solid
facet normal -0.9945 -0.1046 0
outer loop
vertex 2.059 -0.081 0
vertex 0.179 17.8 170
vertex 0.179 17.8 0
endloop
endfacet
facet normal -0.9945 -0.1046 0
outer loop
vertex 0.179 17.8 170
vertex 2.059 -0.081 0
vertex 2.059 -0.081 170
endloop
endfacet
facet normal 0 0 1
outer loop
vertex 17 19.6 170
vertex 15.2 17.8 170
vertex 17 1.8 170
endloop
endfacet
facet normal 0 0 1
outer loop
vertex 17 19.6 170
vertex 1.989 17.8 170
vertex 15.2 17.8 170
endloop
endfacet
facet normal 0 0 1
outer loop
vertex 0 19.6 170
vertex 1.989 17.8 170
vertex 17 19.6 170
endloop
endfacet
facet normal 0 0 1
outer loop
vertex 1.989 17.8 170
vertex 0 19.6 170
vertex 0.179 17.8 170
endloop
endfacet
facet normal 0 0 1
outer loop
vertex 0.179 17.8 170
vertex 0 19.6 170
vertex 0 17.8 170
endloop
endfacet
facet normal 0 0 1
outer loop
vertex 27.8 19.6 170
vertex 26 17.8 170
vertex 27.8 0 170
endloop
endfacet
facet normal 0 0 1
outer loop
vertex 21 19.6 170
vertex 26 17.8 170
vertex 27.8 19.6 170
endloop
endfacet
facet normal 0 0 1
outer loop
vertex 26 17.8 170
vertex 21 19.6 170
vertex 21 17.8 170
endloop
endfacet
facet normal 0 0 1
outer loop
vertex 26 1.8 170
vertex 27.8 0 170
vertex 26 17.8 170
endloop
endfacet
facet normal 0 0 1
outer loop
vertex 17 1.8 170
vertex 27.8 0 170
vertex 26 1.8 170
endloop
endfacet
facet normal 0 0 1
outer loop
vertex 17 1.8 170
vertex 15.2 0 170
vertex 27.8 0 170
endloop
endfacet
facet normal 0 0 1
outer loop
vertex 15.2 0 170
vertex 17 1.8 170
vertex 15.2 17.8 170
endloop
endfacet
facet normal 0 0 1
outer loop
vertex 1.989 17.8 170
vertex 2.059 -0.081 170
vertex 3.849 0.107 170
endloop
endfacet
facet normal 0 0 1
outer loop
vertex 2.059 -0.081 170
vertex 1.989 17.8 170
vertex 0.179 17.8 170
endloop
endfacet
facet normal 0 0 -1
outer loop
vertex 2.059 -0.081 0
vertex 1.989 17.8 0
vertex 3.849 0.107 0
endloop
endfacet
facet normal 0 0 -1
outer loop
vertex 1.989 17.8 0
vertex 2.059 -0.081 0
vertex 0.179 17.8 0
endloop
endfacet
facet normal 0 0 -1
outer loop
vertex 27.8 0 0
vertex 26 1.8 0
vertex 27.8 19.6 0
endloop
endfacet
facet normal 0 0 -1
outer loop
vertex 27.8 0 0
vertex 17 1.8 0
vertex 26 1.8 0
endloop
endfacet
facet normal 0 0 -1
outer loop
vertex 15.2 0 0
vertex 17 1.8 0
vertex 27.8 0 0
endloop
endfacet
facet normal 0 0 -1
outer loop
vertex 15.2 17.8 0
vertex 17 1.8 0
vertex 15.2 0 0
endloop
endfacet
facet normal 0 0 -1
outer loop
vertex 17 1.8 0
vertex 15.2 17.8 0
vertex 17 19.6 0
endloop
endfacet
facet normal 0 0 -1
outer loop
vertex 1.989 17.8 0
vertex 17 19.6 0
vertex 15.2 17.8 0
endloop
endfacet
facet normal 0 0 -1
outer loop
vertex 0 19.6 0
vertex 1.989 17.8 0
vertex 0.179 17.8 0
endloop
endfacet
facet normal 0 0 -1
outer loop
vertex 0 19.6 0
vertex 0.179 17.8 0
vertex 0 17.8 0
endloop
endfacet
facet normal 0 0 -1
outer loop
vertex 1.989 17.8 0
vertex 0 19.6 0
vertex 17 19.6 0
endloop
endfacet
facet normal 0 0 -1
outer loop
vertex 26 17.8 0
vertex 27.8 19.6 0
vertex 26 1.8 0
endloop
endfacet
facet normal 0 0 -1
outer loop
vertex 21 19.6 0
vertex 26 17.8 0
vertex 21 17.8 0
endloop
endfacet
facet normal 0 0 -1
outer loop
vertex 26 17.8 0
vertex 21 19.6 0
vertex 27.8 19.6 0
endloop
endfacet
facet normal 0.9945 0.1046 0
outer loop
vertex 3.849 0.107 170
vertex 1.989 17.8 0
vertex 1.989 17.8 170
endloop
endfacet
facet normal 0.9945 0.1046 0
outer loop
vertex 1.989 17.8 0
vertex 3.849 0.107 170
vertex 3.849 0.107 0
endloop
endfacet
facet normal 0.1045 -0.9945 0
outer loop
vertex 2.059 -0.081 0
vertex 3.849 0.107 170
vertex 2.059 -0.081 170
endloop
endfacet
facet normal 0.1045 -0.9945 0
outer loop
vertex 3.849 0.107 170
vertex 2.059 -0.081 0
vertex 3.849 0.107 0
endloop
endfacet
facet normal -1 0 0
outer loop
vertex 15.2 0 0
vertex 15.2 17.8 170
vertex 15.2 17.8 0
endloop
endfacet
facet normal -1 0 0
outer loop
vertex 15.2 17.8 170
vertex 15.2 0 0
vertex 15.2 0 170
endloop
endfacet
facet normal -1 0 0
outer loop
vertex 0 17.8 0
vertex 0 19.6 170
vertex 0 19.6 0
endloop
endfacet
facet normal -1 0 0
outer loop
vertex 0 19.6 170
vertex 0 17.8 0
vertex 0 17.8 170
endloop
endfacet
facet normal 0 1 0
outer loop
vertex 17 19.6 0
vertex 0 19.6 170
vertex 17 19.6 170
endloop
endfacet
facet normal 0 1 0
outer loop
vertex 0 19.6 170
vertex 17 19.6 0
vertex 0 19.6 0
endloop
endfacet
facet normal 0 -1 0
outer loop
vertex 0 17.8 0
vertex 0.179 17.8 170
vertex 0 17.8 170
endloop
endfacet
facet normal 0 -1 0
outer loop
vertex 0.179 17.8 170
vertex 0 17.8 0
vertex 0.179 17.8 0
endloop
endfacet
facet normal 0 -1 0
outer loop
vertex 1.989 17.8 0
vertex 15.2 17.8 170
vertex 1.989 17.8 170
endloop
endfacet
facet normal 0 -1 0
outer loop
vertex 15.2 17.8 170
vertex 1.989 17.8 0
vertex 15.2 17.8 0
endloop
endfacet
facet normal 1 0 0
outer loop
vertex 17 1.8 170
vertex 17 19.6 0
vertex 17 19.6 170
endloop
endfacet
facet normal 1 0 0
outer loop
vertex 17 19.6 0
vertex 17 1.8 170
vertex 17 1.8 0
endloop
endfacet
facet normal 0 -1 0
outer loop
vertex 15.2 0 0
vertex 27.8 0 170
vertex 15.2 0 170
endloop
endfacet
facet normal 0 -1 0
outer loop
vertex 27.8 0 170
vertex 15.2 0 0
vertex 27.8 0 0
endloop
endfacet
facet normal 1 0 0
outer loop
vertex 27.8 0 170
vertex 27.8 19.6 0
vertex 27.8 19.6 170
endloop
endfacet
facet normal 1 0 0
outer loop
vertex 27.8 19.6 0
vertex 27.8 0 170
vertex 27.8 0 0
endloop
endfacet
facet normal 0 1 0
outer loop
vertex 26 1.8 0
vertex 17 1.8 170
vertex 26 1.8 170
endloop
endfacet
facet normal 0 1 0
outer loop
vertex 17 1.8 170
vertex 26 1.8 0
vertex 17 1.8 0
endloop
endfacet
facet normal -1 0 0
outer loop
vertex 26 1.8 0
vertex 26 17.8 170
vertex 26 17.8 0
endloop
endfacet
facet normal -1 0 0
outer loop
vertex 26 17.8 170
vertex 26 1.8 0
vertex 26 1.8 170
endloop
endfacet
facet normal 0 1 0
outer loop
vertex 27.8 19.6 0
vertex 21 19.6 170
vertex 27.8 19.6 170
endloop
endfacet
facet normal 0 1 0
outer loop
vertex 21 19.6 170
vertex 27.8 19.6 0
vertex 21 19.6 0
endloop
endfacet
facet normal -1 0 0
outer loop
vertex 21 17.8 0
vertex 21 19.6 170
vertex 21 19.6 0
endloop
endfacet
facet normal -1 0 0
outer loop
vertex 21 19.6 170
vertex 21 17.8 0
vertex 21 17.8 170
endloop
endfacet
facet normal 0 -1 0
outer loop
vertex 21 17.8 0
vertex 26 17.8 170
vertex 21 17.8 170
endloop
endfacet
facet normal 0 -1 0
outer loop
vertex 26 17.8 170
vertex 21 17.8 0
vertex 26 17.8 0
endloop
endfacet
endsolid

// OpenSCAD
////////////////////////////////////////////////////////////////////////////////////////////////////////////////////////
// measurements

cube_shelf_vertical_support_x = 12.4;

power_cable_x = 3.0;
power_cable_y = 10.0;

// tray_z = 125.0;
tray_z = 170.0;

////////////////////////////////////////////////////////////////////////////////////////////////////////////////////////
// settings

render_mode = "preview";
// render_mode = "print";

wall_width = 1.8;

cube_shelf_pinch_angle = 6.0;
cube_shelf_back_clearance = 1.0;

power_cable_entry_gap = 4.0;
power_cable_clearance = 3.0;

wall_preview_y = 120;

////////////////////////////////////////////////////////////////////////////////////////////////////////////////////////
// calculations

$fn = $preview ? 32 : 128;

power_cable_channel_x = power_cable_x + power_cable_clearance * 2;
power_cable_channel_y = power_cable_y + power_cable_clearance * 2;

tray_y = power_cable_channel_y + wall_width * 2;

////////////////////////////////////////////////////////////////////////////////////////////////////////////////////////
// models

if( render_mode == "preview" )
{
    // preview the cube shelf wall
    % translate([ wall_width + cube_shelf_back_clearance, -wall_preview_y + power_cable_channel_y + wall_width, 0 ])
        cube([ cube_shelf_vertical_support_x, wall_preview_y, tray_z ]);

    // preview the cable
    % translate([ wall_width * 2 + cube_shelf_vertical_support_x + cube_shelf_back_clearance, wall_width, 0 ])
        // cylinder( h = tray_z, r = power_cable_y );
        cube([ power_cable_x, power_cable_y, tray_z ]);

    CubeShelfPowerCableTray();
}
else if( render_mode == "print" )
{
    CubeShelfPowerCableTray();
}
else
{
    assert( false, str( "Unknown render mode: ", render_mode ) );
}

////////////////////////////////////////////////////////////////////////////////////////////////////////////////////////

module CubeShelfPowerCableTray()
{
    center_wall_x = wall_width + cube_shelf_vertical_support_x + cube_shelf_back_clearance;
    right_wall_x = center_wall_x + wall_width + power_cable_channel_x;
    gap_wall_x = center_wall_x + wall_width + power_cable_entry_gap;

    back_wall_y = wall_width + power_cable_channel_y;

    // left wall
    translate([ wall_width, tray_y, 0 ])
        rotate([ 0, 0, 180 + cube_shelf_pinch_angle ])
            cube([ wall_width, tray_y, tray_z ]);

    // behind cube shelf
    translate([ 0, back_wall_y, 0 ])
        cube([ center_wall_x, wall_width, tray_z ]);

    // center wall
    translate([ center_wall_x, 0, 0 ])
        cube([ wall_width, tray_y, tray_z ]);

    // in front of cable
    translate([ center_wall_x, 0, 0 ])
        cube([ wall_width * 2 + power_cable_channel_x, wall_width, tray_z ]);

    // right of cable
    translate([ right_wall_x, 0, 0 ])
        cube([ wall_width, tray_y, tray_z ]);

    // behind cable
    translate([ gap_wall_x, back_wall_y, 0 ])
        cube([ right_wall_x - gap_wall_x, wall_width, tray_z ]);
}

////////////////////////////////////////////////////////////////////////////////////////////////////////////////////////
